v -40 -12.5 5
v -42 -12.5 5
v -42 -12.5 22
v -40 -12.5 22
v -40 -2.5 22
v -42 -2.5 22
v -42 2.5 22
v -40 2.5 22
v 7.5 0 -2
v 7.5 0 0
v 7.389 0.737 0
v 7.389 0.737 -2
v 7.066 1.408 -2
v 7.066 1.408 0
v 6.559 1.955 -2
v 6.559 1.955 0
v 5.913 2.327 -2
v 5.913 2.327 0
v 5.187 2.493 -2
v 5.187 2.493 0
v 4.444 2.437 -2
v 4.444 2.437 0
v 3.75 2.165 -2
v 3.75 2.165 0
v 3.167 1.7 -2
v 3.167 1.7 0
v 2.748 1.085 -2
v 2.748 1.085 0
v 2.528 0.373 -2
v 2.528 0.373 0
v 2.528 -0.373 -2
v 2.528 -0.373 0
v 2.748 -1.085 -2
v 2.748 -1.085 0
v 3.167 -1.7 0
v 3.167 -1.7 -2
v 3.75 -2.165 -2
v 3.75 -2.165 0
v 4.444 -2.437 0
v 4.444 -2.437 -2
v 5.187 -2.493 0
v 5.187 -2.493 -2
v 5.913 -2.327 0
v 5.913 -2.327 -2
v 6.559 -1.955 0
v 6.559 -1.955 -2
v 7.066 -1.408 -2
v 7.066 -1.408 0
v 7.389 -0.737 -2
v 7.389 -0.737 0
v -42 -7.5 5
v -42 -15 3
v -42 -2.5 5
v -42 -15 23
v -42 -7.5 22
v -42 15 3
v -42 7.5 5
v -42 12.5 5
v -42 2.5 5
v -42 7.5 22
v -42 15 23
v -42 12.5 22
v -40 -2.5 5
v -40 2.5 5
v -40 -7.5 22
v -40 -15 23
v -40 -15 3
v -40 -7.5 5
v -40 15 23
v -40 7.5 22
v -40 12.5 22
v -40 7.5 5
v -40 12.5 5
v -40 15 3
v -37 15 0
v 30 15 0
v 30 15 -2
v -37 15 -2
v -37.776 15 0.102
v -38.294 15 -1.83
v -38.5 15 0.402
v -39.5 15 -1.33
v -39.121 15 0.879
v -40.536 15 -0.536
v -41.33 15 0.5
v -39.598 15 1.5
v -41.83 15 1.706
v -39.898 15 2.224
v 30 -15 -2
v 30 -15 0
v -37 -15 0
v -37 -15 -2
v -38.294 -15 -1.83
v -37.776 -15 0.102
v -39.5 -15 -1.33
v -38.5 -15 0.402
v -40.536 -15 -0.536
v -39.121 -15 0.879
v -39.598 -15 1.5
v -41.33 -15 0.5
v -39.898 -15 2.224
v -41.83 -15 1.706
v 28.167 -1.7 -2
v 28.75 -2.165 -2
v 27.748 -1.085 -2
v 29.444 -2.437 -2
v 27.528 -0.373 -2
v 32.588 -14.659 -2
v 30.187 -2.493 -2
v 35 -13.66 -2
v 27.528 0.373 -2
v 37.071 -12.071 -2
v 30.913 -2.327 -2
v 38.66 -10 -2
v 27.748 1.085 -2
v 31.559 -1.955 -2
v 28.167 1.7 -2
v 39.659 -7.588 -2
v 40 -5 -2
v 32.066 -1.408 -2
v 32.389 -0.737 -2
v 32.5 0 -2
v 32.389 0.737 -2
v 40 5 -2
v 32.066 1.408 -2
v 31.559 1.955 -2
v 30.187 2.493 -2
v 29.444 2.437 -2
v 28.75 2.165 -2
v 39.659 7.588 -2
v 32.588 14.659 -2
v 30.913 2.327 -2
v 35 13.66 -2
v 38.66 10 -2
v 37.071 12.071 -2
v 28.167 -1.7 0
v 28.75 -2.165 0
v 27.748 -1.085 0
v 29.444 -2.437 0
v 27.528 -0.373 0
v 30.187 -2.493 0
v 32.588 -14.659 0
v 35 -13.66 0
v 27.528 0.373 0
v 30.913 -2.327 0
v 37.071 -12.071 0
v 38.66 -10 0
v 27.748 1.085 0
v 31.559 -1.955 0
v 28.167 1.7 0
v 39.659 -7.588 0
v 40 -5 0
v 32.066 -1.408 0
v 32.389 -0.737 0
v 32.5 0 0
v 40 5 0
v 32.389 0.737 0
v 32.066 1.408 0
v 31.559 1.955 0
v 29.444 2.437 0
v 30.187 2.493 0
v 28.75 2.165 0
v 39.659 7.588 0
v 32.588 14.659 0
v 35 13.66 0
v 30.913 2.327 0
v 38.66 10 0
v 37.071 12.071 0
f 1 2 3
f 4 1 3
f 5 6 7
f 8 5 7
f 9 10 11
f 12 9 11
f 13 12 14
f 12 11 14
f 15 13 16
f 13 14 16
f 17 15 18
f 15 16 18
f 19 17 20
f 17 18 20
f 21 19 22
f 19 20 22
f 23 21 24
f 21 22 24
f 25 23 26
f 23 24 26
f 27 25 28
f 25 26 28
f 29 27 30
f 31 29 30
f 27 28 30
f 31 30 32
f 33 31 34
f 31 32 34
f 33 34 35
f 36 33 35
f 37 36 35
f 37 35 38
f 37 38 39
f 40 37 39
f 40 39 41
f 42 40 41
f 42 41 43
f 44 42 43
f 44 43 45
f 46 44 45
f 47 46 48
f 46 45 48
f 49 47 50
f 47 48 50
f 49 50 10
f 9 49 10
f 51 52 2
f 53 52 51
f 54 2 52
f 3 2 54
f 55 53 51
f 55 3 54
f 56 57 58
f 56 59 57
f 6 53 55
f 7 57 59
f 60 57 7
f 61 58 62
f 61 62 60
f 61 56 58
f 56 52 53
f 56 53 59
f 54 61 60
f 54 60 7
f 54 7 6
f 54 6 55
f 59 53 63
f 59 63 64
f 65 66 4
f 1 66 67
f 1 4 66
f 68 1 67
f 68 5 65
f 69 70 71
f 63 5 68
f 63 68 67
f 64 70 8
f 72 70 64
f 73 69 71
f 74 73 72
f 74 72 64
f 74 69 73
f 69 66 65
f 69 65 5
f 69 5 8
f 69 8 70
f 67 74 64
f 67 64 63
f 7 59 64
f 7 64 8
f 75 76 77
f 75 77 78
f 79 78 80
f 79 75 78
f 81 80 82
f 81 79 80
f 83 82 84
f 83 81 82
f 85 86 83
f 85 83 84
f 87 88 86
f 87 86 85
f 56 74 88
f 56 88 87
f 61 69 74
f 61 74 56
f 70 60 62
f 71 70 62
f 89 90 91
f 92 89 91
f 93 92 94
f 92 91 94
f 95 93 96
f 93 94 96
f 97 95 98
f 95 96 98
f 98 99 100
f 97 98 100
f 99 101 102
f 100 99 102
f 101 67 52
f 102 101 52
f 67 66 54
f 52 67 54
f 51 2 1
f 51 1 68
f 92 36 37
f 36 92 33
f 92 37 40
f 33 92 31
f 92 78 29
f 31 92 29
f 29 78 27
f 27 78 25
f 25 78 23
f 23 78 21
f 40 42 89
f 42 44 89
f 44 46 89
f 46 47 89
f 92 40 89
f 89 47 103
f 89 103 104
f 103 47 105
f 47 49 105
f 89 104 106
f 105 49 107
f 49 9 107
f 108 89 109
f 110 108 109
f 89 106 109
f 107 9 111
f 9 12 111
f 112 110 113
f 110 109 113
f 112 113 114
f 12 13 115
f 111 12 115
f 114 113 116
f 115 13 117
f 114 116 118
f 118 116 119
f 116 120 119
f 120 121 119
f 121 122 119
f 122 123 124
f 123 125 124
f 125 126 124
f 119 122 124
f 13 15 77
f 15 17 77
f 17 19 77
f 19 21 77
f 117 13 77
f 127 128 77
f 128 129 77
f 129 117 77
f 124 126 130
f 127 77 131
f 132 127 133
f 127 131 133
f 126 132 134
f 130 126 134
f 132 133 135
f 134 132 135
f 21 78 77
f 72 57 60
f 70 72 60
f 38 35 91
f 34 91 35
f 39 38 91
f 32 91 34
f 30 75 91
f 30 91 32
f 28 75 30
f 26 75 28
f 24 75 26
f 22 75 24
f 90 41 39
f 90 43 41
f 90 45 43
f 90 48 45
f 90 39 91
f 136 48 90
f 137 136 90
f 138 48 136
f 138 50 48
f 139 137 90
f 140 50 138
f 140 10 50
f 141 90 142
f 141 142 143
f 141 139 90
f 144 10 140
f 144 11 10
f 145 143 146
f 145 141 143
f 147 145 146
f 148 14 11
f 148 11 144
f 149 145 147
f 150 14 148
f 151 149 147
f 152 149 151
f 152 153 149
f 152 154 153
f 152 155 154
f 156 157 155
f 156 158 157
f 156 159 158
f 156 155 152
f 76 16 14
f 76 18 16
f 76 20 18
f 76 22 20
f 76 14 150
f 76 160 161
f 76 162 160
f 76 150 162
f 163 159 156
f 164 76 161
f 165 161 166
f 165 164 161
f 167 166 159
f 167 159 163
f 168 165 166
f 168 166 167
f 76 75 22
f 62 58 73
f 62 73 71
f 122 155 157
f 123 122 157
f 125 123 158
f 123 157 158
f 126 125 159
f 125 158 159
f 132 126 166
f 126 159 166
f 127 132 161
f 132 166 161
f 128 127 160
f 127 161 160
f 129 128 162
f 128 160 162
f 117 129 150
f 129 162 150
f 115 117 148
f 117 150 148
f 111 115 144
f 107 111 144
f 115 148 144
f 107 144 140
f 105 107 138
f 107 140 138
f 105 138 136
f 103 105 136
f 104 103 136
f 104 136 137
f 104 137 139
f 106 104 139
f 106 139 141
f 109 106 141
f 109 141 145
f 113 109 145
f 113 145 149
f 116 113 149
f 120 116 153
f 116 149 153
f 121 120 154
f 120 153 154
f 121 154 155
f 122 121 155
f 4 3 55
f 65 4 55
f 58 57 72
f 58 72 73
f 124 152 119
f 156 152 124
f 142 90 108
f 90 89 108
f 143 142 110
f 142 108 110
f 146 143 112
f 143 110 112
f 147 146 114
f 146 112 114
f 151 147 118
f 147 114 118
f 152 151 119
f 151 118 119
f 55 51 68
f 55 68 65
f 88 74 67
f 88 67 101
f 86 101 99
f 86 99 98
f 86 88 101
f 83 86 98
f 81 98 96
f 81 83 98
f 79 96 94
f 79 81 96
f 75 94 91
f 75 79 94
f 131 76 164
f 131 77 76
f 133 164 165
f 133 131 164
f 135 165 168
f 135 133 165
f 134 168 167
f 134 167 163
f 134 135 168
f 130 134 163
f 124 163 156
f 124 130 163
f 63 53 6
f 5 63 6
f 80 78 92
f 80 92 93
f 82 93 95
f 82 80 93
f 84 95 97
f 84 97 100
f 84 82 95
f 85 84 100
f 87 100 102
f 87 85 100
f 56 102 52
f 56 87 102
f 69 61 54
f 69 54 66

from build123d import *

# Parameters (mm, degrees)
SKETCH1_W                    = 80
SKETCH1_H                    = 30
SKETCH1_R                    = 2.5
BASE_FLANGE1_DEPTH           = 2
FILLET1_R                    = 10
EDGE_FLANGE1_STRIP_W         = 14
EDGE_FLANGE1_STRIP_H         = 2
EDGE_FLANGE1_STRIP_CUT_DEPTH = 30
EDGE_FLANGE1_DEPTH           = 30
SKETCH9_W                    = 17
SKETCH9_H                    = 5
CUT_EXTRUDE1_DEPTH           = 10


# Sheet-metal steps are written as plain solids
with BuildPart() as part:
    # Sketch1 → Base-Flange1 (new body)
    with BuildSketch(Plane.XY):
        Rectangle(SKETCH1_W, SKETCH1_H)
        with Locations((30, 0)):
            Circle(SKETCH1_R, mode=Mode.SUBTRACT)
        with Locations((5, 0)):
            Circle(SKETCH1_R, mode=Mode.SUBTRACT)
    extrude(amount=-BASE_FLANGE1_DEPTH)

    # Fillet1
    fillet1_edges = [part.edges().sort_by_distance(p)[0] for p in [
        (40, -15, -1),
        (40, 15, -1),
    ]]
    fillet(fillet1_edges, radius=FILLET1_R)

    # Edge-Flange1 strip (across the edge) → Edge-Flange1 strip cut (cut)
    with BuildSketch(Plane(origin=(-40, 15, 0), x_dir=(1, 0, 0), z_dir=(0, -1, 0))):
        with Locations((-4, -1)):
            Rectangle(EDGE_FLANGE1_STRIP_W, EDGE_FLANGE1_STRIP_H)
    extrude(amount=EDGE_FLANGE1_STRIP_CUT_DEPTH, mode=Mode.SUBTRACT)

    # Edge-Flange1 section (across the edge) → Edge-Flange1 (add)
    with BuildSketch(Plane(origin=(-40, 15, 0), x_dir=(1, 0, 0), z_dir=(0, -1, 0))):
        with BuildLine():
            Line((-2, 3), (-2, 23))
            Line((-2, 23), (0, 23))
            Line((0, 23), (0, 3))
            ThreePointArc((0, 3), (0.878679656, 0.878679656), (3, 0))
            Line((3, 0), (3, -2))
            ThreePointArc((3, -2), (-0.535533906, -0.535533906), (-2, 3))
        make_face()
    extrude(amount=EDGE_FLANGE1_DEPTH)

    # Sketch9 → Cut-Extrude1 (cut)
    with BuildSketch(Plane.ZY.offset(42)):
        with Locations((13.5, 10)):
            Rectangle(SKETCH9_W, SKETCH9_H)
        with Locations((13.5, 0)):
            Rectangle(SKETCH9_W, SKETCH9_H)
        with Locations((13.5, -10)):
            Rectangle(SKETCH9_W, SKETCH9_H)
    extrude(amount=-CUT_EXTRUDE1_DEPTH, mode=Mode.SUBTRACT)


solid = part.part
